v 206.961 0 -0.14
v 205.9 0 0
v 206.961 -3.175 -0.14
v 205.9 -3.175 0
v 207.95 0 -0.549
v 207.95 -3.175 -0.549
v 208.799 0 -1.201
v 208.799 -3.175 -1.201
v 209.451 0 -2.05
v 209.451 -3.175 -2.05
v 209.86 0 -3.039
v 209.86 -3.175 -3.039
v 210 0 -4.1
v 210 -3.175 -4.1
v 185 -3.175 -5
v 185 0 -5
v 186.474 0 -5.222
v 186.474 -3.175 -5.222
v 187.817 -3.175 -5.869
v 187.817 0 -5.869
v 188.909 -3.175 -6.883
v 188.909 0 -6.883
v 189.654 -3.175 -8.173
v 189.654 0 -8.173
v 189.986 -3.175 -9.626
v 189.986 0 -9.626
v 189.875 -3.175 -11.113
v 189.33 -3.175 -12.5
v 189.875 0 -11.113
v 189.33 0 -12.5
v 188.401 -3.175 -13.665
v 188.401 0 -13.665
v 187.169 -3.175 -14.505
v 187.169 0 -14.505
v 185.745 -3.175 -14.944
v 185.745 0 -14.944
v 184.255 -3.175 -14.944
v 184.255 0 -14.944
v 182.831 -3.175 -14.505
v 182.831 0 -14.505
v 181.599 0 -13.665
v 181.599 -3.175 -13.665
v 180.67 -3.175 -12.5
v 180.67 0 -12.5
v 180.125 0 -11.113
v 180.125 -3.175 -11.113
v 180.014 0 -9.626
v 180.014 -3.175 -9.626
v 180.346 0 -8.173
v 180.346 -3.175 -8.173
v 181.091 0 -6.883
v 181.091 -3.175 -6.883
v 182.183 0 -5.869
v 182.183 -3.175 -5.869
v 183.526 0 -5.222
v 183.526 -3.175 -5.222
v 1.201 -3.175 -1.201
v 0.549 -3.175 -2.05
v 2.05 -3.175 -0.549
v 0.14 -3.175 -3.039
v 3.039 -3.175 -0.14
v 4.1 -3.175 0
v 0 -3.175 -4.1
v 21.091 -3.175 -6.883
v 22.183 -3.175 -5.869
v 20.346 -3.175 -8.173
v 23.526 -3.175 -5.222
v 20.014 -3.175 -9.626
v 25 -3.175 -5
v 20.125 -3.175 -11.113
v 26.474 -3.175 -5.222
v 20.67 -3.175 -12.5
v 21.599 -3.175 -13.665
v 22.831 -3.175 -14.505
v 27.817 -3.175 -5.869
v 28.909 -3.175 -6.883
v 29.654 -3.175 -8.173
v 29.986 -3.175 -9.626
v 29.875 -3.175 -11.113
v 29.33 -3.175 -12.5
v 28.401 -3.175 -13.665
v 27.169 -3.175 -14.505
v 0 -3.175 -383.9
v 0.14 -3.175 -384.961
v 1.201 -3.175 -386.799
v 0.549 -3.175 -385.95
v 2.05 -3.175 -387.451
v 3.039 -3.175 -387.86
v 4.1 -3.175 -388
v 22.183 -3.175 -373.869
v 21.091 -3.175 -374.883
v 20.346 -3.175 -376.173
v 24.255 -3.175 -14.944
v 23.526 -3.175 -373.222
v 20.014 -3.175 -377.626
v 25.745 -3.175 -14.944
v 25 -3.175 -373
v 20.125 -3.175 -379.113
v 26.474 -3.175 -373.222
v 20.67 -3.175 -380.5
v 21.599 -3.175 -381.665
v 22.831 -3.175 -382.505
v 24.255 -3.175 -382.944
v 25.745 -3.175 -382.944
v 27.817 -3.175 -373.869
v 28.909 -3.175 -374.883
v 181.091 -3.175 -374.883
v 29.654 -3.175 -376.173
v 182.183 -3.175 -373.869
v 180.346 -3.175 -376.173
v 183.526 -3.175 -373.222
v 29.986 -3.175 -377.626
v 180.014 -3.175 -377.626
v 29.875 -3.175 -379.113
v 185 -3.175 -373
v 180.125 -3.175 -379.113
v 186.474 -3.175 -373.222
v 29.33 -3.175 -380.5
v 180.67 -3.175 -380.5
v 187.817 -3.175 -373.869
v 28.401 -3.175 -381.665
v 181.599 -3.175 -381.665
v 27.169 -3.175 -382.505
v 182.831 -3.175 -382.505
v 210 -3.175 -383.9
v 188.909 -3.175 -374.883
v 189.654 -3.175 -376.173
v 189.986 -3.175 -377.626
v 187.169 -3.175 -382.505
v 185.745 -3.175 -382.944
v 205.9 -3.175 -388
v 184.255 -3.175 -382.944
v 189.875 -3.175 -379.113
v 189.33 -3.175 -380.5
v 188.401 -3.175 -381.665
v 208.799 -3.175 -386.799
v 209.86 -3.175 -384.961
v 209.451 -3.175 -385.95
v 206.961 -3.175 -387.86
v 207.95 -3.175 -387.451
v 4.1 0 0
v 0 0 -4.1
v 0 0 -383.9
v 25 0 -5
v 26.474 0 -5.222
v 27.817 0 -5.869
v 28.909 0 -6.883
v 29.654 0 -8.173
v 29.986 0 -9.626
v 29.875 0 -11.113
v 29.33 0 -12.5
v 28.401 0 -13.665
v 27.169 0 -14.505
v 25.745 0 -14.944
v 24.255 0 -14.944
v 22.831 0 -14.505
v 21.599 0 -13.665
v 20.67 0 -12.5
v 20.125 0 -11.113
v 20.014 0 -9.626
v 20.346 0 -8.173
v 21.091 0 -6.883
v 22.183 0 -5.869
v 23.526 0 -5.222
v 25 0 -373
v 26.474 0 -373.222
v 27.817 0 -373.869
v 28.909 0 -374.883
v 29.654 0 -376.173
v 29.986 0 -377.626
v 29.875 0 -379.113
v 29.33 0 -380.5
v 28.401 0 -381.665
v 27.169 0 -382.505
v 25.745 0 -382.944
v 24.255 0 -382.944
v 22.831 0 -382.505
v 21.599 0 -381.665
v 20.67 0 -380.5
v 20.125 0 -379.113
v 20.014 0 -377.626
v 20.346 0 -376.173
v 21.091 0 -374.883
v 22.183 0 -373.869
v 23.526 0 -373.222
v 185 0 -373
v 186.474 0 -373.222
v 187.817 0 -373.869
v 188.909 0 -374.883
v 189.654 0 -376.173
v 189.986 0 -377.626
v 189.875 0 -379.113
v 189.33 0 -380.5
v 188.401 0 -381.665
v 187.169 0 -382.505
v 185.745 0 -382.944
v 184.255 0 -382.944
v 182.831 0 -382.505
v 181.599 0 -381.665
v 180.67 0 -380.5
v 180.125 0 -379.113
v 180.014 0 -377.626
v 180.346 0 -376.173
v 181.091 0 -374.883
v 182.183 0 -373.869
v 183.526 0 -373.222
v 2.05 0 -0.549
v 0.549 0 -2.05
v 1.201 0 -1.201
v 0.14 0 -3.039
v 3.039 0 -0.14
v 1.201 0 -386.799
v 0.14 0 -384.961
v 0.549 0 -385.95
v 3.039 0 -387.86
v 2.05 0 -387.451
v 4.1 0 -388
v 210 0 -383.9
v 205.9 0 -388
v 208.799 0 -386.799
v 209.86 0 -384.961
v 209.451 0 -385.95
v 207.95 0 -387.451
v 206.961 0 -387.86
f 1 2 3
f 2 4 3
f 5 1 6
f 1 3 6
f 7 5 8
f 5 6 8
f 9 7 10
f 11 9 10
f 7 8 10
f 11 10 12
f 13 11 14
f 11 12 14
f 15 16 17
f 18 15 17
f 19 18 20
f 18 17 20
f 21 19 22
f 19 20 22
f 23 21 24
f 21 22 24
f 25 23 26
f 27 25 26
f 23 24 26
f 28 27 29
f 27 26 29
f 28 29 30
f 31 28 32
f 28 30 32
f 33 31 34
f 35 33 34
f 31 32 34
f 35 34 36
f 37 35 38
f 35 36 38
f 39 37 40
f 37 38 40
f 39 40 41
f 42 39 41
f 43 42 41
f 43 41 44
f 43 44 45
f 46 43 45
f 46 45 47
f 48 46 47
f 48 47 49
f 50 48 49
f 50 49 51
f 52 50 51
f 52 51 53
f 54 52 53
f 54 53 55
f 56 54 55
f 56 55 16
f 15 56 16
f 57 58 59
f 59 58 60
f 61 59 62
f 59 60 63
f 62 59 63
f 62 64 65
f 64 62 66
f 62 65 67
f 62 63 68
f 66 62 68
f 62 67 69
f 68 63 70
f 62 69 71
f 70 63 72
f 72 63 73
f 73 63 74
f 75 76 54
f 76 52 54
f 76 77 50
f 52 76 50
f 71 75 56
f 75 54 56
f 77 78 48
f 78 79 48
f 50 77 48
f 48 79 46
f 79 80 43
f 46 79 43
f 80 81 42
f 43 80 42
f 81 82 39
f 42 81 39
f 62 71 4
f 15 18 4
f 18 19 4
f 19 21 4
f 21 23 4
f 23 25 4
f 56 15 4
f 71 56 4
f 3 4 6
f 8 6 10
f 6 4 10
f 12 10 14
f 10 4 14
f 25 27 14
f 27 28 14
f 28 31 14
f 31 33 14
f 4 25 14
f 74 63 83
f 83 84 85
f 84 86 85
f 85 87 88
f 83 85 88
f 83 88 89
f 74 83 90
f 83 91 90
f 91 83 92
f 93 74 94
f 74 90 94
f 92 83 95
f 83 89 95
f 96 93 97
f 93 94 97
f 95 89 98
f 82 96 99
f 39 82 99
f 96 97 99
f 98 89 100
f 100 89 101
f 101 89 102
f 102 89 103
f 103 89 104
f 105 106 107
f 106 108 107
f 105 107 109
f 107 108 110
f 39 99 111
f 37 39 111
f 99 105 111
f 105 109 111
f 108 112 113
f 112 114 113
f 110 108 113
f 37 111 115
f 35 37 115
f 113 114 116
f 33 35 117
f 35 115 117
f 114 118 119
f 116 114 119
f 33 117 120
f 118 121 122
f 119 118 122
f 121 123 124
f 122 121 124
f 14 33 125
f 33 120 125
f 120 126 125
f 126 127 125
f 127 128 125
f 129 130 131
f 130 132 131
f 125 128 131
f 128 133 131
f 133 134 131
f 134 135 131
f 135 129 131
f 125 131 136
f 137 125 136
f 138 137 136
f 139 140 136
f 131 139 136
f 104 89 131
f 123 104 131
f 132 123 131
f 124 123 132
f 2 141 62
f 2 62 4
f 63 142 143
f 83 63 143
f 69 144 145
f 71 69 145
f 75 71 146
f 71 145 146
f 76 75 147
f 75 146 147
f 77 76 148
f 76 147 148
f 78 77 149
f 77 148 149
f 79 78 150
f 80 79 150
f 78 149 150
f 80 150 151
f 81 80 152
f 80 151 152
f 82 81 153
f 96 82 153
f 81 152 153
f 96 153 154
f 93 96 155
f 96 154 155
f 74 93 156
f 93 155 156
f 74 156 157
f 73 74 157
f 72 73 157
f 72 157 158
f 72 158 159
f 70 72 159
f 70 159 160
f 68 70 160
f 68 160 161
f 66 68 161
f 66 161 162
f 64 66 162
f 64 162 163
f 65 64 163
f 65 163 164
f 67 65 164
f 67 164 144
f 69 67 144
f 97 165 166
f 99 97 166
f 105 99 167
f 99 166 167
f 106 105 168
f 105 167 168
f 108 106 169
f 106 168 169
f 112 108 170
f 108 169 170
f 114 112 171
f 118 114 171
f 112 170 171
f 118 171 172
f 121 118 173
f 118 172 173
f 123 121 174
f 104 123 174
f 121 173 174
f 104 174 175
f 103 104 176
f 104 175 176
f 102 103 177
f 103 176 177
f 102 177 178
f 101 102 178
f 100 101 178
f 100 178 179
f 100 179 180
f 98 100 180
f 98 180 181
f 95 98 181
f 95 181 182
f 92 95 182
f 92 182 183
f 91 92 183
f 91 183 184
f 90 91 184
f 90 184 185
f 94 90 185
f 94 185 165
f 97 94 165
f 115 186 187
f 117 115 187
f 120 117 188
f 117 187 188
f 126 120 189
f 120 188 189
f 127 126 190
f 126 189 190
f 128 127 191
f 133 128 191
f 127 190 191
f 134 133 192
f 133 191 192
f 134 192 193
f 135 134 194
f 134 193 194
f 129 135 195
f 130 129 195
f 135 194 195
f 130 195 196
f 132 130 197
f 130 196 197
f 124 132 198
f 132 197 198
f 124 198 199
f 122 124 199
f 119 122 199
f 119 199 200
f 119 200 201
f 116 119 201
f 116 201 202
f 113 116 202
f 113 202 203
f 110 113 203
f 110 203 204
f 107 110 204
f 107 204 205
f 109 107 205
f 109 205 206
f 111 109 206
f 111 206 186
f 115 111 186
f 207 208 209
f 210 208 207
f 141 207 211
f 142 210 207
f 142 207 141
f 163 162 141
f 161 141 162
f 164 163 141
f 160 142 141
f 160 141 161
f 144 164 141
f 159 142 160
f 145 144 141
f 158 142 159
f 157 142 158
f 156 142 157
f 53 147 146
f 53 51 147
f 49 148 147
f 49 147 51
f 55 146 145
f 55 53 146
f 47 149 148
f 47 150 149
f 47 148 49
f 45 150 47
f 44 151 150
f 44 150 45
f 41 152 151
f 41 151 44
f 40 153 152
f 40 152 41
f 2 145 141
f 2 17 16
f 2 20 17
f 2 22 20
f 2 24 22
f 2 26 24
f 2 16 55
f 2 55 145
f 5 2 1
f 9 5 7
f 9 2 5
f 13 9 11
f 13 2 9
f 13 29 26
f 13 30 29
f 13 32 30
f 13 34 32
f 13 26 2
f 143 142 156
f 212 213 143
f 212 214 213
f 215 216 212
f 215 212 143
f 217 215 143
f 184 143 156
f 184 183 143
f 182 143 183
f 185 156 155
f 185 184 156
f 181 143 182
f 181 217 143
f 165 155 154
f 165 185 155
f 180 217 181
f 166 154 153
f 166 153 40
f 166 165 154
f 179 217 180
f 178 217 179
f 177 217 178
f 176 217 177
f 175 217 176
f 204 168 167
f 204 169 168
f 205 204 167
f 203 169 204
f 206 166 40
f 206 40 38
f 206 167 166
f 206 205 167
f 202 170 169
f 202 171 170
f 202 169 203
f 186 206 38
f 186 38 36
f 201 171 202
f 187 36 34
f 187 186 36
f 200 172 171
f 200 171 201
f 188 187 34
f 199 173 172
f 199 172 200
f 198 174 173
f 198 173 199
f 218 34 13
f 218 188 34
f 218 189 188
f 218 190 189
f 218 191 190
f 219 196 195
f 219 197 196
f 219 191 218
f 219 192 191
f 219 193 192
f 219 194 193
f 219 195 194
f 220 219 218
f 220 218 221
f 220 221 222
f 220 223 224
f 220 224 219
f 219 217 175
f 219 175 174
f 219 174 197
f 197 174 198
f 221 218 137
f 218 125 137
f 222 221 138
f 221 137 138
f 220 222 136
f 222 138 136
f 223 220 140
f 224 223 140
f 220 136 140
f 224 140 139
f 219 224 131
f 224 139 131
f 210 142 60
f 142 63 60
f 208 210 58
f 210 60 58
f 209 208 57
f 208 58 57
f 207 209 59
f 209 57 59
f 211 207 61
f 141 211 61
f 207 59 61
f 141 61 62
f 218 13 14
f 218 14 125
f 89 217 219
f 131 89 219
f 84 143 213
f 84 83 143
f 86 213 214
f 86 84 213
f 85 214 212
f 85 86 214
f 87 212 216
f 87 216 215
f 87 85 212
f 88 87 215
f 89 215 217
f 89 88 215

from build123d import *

# Parameters (mm, degrees)
SKETCH1_W          = 210
SKETCH1_H          = 388
BASE_FLANGE1_DEPTH = 3.175
FILLET1_R          = 4.1
SKETCH6_R          = 5
CUT_EXTRUDE1_DEPTH = 10


# Sheet-metal steps are written as plain solids
with BuildPart() as part:
    # Sketch1 → Base-Flange1 (new body)
    with BuildSketch(Plane(origin=(0, 0, 0), x_dir=(1, 0, 0), z_dir=(0, 1, 0))):
        with Locations((105, 194)):
            Rectangle(SKETCH1_W, SKETCH1_H)
    extrude(amount=-BASE_FLANGE1_DEPTH)

    # Fillet1
    fillet1_edges = [part.edges().sort_by_distance(p)[0] for p in [
        (0, -1.5875, -388),
        (210, -1.5875, -388),
        (210, -1.5875, 0),
        (0, -1.5875, 0),
    ]]
    fillet(fillet1_edges, radius=FILLET1_R)

    # Sketch6 → Cut-Extrude1 (cut)
    with BuildSketch(Plane(origin=(0, 0, 0), x_dir=(1, 0, 0), z_dir=(0, 1, 0))):
        with Locations(Location((25, 378, 0), (0, 0, 270))):
            Circle(SKETCH6_R)
        with Locations(Location((185, 378, 0), (0, 0, 270))):
            Circle(SKETCH6_R)
        with Locations(Location((185, 10, 0), (0, 0, 270))):
            Circle(SKETCH6_R)
        with Locations(Location((25, 10, 0), (0, 0, 270))):
            Circle(SKETCH6_R)
    extrude(amount=-CUT_EXTRUDE1_DEPTH, mode=Mode.SUBTRACT)


solid = part.part
